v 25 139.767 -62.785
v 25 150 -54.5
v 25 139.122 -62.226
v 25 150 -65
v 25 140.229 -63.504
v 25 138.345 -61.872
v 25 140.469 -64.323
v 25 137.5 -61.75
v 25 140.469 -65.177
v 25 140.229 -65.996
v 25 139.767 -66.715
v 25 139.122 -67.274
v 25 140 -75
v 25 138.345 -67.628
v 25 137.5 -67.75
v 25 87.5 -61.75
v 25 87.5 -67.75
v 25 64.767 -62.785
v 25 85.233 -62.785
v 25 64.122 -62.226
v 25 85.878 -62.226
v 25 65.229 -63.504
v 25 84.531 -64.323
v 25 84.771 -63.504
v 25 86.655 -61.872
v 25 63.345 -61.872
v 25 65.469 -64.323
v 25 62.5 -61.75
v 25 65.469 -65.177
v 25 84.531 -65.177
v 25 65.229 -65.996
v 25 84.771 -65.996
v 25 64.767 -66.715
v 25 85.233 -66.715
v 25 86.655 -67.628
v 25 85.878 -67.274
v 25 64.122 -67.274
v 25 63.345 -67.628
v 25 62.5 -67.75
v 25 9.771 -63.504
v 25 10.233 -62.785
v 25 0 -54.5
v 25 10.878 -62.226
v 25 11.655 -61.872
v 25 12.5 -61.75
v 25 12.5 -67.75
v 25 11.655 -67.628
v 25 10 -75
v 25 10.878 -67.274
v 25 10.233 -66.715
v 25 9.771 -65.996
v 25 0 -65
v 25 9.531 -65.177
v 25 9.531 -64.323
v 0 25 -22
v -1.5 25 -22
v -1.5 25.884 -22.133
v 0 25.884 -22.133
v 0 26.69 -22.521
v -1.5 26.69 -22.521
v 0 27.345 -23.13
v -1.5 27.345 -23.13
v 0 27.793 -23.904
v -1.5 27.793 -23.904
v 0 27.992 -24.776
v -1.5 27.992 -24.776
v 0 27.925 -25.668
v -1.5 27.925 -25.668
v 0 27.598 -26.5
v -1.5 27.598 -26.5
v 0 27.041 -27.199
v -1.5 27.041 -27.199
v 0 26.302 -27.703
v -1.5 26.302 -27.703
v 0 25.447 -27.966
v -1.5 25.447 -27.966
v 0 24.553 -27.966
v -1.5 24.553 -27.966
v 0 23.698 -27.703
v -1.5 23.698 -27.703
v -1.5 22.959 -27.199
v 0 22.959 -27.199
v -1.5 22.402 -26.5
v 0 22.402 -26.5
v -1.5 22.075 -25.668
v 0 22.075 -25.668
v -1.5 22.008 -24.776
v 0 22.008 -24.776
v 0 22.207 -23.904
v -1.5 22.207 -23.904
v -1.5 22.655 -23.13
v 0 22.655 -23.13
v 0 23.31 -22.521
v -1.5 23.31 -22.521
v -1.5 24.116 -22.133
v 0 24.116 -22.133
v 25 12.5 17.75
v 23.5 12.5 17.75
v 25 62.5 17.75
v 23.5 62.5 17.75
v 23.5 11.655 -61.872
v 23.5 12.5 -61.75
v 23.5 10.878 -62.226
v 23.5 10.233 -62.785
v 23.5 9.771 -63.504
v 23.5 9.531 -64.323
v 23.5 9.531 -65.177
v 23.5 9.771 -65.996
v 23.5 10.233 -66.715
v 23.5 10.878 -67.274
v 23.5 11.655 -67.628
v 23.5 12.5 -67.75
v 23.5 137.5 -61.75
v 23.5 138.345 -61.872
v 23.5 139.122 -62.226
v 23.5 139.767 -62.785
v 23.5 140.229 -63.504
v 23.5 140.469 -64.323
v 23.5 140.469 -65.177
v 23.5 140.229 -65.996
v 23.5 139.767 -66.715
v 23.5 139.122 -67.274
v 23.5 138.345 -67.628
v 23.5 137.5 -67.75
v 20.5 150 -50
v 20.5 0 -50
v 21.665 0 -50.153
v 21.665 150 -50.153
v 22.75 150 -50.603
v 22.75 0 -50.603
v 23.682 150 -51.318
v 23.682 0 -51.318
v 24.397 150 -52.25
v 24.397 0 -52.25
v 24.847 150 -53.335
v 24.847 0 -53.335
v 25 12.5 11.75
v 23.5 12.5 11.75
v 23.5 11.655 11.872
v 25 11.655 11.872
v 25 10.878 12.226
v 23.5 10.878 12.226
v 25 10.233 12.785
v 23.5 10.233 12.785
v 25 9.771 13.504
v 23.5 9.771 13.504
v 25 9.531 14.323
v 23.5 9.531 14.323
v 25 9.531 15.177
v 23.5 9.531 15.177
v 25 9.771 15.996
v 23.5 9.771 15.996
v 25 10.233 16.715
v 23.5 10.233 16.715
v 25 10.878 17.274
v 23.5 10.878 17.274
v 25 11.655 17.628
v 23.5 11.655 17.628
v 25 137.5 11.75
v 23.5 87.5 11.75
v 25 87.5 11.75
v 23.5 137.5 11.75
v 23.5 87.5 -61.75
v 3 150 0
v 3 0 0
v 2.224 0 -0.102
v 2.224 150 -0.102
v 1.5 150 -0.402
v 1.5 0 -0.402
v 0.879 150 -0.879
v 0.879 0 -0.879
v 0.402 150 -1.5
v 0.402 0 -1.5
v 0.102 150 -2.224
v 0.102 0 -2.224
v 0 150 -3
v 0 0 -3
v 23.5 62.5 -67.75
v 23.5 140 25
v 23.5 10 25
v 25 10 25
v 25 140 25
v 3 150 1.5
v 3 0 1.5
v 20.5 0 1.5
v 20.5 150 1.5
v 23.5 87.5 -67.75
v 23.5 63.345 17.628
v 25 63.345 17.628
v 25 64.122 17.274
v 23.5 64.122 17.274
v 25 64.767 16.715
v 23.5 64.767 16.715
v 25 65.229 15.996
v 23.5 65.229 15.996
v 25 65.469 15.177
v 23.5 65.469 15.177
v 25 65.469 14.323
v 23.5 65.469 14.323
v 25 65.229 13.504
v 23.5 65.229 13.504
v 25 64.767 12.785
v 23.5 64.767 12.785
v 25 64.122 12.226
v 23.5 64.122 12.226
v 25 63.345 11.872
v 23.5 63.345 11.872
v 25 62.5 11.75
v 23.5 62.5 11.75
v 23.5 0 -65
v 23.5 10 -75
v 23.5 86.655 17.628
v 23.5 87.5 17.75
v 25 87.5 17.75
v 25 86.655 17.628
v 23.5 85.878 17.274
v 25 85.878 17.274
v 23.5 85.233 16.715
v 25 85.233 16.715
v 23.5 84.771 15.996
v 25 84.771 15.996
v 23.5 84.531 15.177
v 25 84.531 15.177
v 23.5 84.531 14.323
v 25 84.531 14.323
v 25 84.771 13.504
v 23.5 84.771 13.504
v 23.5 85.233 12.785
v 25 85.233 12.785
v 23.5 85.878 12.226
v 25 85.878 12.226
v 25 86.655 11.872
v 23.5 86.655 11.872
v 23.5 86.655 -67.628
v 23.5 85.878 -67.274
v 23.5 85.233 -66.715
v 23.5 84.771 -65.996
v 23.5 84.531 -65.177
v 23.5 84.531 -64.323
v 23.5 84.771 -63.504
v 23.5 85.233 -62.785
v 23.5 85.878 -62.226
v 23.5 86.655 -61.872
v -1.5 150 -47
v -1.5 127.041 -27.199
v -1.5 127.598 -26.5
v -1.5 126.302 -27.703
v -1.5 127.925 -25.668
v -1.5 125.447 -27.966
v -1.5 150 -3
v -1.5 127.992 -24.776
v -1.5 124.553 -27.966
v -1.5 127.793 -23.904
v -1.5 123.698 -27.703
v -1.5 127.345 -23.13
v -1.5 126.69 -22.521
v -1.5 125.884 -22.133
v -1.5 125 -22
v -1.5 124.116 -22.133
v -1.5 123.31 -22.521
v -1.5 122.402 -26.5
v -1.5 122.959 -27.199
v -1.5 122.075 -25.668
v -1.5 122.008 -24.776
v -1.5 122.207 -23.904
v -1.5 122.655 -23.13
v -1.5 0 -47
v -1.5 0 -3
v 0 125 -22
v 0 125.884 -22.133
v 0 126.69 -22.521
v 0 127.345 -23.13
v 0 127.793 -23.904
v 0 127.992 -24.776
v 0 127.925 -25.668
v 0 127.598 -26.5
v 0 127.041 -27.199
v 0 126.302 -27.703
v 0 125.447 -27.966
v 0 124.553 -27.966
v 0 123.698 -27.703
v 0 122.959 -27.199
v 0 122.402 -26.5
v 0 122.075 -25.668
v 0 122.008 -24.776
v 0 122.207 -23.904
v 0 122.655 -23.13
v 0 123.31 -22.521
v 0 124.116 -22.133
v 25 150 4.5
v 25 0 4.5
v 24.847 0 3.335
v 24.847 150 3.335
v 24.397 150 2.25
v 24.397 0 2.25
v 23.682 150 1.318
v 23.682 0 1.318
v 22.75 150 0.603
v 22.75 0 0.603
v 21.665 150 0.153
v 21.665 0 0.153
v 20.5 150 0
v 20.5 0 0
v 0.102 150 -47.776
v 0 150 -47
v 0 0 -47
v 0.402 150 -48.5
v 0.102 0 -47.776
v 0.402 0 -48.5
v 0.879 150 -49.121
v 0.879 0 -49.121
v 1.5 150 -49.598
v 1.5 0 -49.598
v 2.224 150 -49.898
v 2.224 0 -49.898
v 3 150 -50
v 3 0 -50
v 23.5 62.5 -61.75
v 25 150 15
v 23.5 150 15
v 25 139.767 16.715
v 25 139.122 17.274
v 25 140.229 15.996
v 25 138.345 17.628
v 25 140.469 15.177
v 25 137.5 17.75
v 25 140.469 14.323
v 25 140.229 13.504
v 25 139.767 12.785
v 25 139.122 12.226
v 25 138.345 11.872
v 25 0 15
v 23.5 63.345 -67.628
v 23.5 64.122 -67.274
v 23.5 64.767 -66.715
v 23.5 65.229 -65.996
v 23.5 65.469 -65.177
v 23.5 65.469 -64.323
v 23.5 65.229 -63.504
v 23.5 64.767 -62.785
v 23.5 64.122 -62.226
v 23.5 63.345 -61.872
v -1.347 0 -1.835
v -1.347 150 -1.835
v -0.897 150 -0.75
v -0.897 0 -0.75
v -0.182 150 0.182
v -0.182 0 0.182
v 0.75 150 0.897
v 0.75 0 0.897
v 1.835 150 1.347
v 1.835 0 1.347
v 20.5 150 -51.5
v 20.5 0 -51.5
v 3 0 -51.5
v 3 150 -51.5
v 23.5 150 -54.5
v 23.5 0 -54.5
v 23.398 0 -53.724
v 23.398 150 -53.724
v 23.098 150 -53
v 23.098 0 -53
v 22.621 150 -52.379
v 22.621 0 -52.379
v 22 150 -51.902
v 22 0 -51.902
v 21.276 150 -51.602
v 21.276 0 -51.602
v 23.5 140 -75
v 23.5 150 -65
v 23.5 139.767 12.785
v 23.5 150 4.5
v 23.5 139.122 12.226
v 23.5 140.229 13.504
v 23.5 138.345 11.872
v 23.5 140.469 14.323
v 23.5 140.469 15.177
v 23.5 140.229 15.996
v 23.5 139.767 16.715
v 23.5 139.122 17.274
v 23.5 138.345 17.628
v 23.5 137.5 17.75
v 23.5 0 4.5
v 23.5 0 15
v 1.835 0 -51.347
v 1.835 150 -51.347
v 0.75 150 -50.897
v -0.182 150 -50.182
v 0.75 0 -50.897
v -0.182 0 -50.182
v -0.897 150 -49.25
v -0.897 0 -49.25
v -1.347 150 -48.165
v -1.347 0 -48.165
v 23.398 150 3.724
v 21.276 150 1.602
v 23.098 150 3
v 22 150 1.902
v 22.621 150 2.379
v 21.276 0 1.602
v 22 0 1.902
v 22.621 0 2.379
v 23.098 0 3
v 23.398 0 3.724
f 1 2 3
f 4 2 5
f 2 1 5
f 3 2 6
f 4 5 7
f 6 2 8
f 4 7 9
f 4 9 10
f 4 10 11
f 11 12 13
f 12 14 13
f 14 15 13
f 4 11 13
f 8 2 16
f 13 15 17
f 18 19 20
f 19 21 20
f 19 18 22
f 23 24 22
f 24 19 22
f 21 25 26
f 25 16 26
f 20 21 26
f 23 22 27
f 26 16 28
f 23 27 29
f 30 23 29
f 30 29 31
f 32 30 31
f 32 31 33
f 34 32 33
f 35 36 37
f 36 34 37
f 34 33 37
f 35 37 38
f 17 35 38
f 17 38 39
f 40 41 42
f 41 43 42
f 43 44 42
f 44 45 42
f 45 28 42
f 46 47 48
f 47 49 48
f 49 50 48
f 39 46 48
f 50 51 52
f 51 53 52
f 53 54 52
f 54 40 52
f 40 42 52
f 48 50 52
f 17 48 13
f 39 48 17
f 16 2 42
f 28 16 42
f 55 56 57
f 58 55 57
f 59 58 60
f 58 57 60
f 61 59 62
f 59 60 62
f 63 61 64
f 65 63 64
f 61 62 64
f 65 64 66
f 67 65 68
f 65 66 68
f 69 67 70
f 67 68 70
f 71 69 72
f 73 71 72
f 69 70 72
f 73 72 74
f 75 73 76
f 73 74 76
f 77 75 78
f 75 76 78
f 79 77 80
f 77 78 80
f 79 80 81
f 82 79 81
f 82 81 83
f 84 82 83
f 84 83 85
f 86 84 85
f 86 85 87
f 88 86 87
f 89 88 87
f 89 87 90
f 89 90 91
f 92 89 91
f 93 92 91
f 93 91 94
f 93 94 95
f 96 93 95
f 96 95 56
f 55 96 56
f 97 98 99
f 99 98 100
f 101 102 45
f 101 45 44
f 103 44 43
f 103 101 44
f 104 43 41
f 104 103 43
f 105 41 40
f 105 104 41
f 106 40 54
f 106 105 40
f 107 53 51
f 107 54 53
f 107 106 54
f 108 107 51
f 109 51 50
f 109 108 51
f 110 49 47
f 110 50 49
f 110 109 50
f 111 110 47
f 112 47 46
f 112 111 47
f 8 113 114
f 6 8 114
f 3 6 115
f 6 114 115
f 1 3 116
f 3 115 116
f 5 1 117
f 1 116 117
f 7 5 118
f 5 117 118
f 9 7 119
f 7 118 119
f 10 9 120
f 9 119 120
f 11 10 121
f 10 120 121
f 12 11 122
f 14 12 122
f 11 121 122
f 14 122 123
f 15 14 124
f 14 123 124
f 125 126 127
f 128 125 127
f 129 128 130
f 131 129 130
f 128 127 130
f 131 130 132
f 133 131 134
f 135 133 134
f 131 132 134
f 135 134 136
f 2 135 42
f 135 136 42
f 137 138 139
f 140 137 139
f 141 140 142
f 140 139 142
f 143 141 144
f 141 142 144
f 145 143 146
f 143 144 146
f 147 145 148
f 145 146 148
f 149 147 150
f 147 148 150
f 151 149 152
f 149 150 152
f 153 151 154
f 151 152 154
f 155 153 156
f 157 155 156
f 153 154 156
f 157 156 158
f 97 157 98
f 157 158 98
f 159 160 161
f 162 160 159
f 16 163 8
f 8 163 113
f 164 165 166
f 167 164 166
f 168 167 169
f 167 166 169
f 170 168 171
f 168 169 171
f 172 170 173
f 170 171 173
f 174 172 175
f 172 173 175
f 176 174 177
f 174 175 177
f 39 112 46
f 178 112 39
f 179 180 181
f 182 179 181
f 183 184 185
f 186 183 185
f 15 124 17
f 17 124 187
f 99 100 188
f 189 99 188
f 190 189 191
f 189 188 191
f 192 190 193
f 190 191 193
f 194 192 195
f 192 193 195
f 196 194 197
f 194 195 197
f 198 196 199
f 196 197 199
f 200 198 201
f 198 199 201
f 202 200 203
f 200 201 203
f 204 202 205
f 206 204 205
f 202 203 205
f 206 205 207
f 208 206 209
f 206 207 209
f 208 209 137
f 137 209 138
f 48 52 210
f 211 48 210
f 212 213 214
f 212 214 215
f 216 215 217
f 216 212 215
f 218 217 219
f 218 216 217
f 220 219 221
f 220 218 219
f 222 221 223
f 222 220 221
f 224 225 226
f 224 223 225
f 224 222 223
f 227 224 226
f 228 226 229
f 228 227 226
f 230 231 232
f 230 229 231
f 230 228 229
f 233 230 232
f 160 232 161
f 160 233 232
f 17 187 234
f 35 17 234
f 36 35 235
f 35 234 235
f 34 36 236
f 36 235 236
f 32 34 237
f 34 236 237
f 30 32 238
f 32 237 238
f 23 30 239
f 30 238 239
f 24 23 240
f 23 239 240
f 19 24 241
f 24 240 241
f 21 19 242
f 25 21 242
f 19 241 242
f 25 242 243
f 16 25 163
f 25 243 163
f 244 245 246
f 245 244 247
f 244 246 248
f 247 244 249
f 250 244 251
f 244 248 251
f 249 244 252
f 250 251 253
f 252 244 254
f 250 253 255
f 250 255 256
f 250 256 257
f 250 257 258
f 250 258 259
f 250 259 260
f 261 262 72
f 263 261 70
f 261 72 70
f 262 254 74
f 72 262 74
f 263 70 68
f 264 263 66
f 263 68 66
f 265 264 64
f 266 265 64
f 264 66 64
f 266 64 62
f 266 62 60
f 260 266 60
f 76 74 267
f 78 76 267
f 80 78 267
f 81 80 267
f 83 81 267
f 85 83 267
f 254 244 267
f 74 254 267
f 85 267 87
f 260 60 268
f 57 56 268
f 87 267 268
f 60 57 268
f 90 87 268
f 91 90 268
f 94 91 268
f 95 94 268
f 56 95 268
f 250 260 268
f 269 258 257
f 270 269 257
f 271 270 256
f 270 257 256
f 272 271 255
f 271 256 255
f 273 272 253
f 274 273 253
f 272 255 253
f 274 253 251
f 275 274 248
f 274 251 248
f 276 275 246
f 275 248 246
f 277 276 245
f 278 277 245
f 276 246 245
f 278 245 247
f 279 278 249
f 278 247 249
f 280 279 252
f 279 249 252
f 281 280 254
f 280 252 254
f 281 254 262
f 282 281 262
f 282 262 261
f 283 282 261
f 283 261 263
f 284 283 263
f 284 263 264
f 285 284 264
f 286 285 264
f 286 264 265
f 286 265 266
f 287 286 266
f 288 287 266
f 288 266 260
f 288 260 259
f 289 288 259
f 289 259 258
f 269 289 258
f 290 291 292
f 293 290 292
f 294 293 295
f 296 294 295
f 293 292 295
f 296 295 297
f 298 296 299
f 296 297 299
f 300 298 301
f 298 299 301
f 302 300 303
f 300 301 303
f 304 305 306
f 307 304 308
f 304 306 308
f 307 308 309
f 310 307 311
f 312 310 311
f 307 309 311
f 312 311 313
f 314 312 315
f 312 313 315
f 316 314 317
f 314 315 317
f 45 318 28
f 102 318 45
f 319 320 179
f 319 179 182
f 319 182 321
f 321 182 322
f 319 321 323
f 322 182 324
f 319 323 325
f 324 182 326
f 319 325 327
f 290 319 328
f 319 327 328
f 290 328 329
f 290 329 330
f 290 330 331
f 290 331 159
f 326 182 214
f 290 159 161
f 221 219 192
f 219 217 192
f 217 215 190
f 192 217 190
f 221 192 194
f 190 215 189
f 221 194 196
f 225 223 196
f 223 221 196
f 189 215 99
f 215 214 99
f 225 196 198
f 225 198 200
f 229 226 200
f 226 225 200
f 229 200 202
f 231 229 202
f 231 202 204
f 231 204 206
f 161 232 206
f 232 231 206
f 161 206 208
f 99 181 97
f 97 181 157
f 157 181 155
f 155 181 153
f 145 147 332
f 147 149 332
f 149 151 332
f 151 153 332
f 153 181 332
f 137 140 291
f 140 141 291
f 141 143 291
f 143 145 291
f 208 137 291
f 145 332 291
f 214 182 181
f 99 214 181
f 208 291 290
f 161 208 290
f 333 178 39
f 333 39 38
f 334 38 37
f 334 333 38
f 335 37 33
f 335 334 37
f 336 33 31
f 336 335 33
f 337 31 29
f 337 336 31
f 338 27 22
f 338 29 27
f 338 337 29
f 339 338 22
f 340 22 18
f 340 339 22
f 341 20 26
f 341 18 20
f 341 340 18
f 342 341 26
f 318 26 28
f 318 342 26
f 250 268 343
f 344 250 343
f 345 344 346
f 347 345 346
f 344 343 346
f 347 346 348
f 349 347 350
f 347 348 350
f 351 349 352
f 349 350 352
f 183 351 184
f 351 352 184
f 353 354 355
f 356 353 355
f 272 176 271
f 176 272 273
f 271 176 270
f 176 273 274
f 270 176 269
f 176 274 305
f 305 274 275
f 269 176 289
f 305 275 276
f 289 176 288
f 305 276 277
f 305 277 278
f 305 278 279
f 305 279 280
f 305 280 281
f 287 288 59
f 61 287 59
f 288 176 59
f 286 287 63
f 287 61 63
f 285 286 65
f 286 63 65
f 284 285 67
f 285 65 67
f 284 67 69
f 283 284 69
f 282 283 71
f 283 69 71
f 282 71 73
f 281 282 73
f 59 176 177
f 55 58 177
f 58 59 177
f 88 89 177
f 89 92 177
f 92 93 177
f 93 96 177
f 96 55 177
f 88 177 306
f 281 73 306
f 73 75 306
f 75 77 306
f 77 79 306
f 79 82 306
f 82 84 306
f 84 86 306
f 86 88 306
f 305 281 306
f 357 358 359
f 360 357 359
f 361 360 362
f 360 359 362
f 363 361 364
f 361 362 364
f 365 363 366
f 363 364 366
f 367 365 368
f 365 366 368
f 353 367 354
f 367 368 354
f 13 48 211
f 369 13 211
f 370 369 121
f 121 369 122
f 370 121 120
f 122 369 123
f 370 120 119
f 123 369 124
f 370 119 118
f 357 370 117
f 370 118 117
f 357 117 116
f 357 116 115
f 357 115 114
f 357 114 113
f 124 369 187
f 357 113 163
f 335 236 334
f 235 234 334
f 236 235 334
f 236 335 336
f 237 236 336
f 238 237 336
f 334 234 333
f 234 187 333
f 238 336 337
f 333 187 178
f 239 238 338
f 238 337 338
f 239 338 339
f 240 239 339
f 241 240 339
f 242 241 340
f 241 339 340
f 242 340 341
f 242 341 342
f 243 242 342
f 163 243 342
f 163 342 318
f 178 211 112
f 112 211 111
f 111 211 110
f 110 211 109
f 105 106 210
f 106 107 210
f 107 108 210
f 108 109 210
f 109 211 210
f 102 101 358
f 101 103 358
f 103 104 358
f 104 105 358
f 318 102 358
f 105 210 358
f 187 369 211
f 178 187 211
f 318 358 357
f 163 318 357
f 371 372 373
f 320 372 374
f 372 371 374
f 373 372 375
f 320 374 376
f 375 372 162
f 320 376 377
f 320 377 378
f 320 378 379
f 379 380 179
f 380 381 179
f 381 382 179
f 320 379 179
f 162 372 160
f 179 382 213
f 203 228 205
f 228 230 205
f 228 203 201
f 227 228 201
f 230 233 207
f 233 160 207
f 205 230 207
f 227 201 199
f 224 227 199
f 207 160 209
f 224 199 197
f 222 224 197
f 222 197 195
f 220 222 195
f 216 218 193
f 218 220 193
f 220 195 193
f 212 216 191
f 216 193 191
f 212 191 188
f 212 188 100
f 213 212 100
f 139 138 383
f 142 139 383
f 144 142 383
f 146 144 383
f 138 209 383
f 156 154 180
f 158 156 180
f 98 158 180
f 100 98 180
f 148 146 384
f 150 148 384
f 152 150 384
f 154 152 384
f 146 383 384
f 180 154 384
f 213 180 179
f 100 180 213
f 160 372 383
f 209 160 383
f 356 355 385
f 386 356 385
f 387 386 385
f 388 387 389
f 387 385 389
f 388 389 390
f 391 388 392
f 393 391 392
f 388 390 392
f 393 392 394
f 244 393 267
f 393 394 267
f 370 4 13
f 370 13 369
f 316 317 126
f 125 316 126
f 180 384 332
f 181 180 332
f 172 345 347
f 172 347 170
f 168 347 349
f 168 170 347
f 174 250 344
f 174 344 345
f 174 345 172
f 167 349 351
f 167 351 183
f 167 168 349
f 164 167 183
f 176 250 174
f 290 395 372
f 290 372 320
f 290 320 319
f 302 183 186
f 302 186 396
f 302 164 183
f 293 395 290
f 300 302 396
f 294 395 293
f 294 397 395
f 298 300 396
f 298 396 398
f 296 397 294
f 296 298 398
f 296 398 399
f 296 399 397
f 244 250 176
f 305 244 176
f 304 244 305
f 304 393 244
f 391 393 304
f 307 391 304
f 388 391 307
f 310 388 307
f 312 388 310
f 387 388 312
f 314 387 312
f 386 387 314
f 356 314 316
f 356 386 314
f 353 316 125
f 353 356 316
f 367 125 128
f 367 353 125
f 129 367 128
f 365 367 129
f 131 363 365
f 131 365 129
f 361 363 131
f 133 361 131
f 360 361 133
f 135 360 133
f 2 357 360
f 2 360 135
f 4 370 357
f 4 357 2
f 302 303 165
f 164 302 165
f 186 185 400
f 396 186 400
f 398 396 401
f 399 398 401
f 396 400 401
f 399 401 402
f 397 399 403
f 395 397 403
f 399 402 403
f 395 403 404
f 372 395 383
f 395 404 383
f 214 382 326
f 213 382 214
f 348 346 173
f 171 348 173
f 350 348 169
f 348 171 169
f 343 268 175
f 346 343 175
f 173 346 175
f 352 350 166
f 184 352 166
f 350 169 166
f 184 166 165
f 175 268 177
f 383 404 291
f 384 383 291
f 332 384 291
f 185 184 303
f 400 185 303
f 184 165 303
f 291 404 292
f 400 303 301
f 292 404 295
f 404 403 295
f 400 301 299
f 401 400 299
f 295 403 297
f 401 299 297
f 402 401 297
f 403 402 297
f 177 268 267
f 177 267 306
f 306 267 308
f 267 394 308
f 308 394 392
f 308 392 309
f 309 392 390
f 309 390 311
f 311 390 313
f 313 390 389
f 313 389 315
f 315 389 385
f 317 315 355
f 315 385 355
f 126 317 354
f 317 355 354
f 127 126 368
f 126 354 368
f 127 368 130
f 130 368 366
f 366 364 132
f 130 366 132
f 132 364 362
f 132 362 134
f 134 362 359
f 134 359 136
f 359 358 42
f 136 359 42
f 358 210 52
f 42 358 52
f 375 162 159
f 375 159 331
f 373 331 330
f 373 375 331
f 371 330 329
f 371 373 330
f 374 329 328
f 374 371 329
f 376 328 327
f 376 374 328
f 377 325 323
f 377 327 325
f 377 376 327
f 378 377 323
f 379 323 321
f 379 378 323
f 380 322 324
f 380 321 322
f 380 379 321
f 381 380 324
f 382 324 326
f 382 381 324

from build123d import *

# Parameters (mm, degrees)
BASE_FLANGE1_DEPTH = 150
CHAMFER1_SIZE      = 10
SKETCH6_R          = 3
CUT_EXTRUDE1_DEPTH = 10
CUT_EXTRUDE2_DEPTH = 10


# Sheet-metal steps are written as plain solids
with BuildPart() as part:
    # Sketch1 → Base-Flange1 (new body)
    with BuildSketch(Plane(origin=(0, 0, 0), x_dir=(1, 0, 0), z_dir=(0, 1, 0))):
        with BuildLine():
            Line((25, -25), (25, -4.5))
            ThreePointArc((25, -4.5), (23.681980515, -1.318019485), (20.5, 0))
            Line((20.5, 0), (3, 0))
            ThreePointArc((3, 0), (0.878679656, 0.878679656), (0, 3))
            Line((0, 3), (0, 47))
            ThreePointArc((0, 47), (0.878679656, 49.121320344), (3, 50))
            Line((3, 50), (20.5, 50))
            ThreePointArc((20.5, 50), (23.681980515, 51.318019485), (25, 54.5))
            Line((25, 54.5), (25, 75))
            Line((25, 75), (23.5, 75))
            Line((23.5, 75), (23.5, 54.5))
            ThreePointArc((23.5, 54.5), (22.621320344, 52.378679656), (20.5, 51.5))
            Line((20.5, 51.5), (3, 51.5))
            ThreePointArc((3, 51.5), (-0.181980515, 50.181980515), (-1.5, 47))
            Line((-1.5, 47), (-1.5, 3))
            ThreePointArc((-1.5, 3), (-0.181980515, -0.181980515), (3, -1.5))
            Line((3, -1.5), (20.5, -1.5))
            ThreePointArc((20.5, -1.5), (22.621320344, -2.378679656), (23.5, -4.5))
            Line((23.5, -4.5), (23.5, -25))
            Line((23.5, -25), (25, -25))
        make_face()
    extrude(amount=BASE_FLANGE1_DEPTH)

    # Chamfer1
    chamfer1_edges = [part.edges().sort_by_distance(p)[0] for p in [
        (24.25, 0, -75),
        (24.25, 0, 25),
        (24.25, 150, -75),
        (24.25, 150, 25),
    ]]
    chamfer(chamfer1_edges, length=CHAMFER1_SIZE)

    # Sketch6 → Cut-Extrude1 (cut)
    with BuildSketch(Plane.ZY.offset(1.5)):
        with Locations((-25, 25)):
            Circle(SKETCH6_R)
        with Locations((-25, 125)):
            Circle(SKETCH6_R)
    extrude(amount=-CUT_EXTRUDE1_DEPTH, mode=Mode.SUBTRACT)

    # Sketch7 → Cut-Extrude2 (cut)
    with BuildSketch(Plane.ZY.offset(-23.5)):
        with BuildLine():
            Line((-67.75, 12.5), (-67.75, 62.5))
            ThreePointArc((-67.75, 62.5), (-64.75, 65.5), (-61.75, 62.5))
            Line((-61.75, 62.5), (-61.75, 12.5))
            ThreePointArc((-61.75, 12.5), (-64.75, 9.5), (-67.75, 12.5))
        make_face()
        with BuildLine():
            Line((-67.75, 137.5), (-67.75, 87.5))
            ThreePointArc((-67.75, 87.5), (-64.75, 84.5), (-61.75, 87.5))
            Line((-61.75, 87.5), (-61.75, 137.5))
            ThreePointArc((-61.75, 137.5), (-64.75, 140.5), (-67.75, 137.5))
        make_face()
        with BuildLine():
            Line((17.75, 137.5), (17.75, 87.5))
            ThreePointArc((17.75, 87.5), (14.75, 84.5), (11.75, 87.5))
            Line((11.75, 87.5), (11.75, 137.5))
            ThreePointArc((11.75, 137.5), (14.75, 140.5), (17.75, 137.5))
        make_face()
        with BuildLine():
            Line((17.75, 12.5), (17.75, 62.5))
            ThreePointArc((17.75, 62.5), (14.75, 65.5), (11.75, 62.5))
            Line((11.75, 62.5), (11.75, 12.5))
            ThreePointArc((11.75, 12.5), (14.75, 9.5), (17.75, 12.5))
        make_face()
    extrude(amount=-CUT_EXTRUDE2_DEPTH, mode=Mode.SUBTRACT)


solid = part.part
